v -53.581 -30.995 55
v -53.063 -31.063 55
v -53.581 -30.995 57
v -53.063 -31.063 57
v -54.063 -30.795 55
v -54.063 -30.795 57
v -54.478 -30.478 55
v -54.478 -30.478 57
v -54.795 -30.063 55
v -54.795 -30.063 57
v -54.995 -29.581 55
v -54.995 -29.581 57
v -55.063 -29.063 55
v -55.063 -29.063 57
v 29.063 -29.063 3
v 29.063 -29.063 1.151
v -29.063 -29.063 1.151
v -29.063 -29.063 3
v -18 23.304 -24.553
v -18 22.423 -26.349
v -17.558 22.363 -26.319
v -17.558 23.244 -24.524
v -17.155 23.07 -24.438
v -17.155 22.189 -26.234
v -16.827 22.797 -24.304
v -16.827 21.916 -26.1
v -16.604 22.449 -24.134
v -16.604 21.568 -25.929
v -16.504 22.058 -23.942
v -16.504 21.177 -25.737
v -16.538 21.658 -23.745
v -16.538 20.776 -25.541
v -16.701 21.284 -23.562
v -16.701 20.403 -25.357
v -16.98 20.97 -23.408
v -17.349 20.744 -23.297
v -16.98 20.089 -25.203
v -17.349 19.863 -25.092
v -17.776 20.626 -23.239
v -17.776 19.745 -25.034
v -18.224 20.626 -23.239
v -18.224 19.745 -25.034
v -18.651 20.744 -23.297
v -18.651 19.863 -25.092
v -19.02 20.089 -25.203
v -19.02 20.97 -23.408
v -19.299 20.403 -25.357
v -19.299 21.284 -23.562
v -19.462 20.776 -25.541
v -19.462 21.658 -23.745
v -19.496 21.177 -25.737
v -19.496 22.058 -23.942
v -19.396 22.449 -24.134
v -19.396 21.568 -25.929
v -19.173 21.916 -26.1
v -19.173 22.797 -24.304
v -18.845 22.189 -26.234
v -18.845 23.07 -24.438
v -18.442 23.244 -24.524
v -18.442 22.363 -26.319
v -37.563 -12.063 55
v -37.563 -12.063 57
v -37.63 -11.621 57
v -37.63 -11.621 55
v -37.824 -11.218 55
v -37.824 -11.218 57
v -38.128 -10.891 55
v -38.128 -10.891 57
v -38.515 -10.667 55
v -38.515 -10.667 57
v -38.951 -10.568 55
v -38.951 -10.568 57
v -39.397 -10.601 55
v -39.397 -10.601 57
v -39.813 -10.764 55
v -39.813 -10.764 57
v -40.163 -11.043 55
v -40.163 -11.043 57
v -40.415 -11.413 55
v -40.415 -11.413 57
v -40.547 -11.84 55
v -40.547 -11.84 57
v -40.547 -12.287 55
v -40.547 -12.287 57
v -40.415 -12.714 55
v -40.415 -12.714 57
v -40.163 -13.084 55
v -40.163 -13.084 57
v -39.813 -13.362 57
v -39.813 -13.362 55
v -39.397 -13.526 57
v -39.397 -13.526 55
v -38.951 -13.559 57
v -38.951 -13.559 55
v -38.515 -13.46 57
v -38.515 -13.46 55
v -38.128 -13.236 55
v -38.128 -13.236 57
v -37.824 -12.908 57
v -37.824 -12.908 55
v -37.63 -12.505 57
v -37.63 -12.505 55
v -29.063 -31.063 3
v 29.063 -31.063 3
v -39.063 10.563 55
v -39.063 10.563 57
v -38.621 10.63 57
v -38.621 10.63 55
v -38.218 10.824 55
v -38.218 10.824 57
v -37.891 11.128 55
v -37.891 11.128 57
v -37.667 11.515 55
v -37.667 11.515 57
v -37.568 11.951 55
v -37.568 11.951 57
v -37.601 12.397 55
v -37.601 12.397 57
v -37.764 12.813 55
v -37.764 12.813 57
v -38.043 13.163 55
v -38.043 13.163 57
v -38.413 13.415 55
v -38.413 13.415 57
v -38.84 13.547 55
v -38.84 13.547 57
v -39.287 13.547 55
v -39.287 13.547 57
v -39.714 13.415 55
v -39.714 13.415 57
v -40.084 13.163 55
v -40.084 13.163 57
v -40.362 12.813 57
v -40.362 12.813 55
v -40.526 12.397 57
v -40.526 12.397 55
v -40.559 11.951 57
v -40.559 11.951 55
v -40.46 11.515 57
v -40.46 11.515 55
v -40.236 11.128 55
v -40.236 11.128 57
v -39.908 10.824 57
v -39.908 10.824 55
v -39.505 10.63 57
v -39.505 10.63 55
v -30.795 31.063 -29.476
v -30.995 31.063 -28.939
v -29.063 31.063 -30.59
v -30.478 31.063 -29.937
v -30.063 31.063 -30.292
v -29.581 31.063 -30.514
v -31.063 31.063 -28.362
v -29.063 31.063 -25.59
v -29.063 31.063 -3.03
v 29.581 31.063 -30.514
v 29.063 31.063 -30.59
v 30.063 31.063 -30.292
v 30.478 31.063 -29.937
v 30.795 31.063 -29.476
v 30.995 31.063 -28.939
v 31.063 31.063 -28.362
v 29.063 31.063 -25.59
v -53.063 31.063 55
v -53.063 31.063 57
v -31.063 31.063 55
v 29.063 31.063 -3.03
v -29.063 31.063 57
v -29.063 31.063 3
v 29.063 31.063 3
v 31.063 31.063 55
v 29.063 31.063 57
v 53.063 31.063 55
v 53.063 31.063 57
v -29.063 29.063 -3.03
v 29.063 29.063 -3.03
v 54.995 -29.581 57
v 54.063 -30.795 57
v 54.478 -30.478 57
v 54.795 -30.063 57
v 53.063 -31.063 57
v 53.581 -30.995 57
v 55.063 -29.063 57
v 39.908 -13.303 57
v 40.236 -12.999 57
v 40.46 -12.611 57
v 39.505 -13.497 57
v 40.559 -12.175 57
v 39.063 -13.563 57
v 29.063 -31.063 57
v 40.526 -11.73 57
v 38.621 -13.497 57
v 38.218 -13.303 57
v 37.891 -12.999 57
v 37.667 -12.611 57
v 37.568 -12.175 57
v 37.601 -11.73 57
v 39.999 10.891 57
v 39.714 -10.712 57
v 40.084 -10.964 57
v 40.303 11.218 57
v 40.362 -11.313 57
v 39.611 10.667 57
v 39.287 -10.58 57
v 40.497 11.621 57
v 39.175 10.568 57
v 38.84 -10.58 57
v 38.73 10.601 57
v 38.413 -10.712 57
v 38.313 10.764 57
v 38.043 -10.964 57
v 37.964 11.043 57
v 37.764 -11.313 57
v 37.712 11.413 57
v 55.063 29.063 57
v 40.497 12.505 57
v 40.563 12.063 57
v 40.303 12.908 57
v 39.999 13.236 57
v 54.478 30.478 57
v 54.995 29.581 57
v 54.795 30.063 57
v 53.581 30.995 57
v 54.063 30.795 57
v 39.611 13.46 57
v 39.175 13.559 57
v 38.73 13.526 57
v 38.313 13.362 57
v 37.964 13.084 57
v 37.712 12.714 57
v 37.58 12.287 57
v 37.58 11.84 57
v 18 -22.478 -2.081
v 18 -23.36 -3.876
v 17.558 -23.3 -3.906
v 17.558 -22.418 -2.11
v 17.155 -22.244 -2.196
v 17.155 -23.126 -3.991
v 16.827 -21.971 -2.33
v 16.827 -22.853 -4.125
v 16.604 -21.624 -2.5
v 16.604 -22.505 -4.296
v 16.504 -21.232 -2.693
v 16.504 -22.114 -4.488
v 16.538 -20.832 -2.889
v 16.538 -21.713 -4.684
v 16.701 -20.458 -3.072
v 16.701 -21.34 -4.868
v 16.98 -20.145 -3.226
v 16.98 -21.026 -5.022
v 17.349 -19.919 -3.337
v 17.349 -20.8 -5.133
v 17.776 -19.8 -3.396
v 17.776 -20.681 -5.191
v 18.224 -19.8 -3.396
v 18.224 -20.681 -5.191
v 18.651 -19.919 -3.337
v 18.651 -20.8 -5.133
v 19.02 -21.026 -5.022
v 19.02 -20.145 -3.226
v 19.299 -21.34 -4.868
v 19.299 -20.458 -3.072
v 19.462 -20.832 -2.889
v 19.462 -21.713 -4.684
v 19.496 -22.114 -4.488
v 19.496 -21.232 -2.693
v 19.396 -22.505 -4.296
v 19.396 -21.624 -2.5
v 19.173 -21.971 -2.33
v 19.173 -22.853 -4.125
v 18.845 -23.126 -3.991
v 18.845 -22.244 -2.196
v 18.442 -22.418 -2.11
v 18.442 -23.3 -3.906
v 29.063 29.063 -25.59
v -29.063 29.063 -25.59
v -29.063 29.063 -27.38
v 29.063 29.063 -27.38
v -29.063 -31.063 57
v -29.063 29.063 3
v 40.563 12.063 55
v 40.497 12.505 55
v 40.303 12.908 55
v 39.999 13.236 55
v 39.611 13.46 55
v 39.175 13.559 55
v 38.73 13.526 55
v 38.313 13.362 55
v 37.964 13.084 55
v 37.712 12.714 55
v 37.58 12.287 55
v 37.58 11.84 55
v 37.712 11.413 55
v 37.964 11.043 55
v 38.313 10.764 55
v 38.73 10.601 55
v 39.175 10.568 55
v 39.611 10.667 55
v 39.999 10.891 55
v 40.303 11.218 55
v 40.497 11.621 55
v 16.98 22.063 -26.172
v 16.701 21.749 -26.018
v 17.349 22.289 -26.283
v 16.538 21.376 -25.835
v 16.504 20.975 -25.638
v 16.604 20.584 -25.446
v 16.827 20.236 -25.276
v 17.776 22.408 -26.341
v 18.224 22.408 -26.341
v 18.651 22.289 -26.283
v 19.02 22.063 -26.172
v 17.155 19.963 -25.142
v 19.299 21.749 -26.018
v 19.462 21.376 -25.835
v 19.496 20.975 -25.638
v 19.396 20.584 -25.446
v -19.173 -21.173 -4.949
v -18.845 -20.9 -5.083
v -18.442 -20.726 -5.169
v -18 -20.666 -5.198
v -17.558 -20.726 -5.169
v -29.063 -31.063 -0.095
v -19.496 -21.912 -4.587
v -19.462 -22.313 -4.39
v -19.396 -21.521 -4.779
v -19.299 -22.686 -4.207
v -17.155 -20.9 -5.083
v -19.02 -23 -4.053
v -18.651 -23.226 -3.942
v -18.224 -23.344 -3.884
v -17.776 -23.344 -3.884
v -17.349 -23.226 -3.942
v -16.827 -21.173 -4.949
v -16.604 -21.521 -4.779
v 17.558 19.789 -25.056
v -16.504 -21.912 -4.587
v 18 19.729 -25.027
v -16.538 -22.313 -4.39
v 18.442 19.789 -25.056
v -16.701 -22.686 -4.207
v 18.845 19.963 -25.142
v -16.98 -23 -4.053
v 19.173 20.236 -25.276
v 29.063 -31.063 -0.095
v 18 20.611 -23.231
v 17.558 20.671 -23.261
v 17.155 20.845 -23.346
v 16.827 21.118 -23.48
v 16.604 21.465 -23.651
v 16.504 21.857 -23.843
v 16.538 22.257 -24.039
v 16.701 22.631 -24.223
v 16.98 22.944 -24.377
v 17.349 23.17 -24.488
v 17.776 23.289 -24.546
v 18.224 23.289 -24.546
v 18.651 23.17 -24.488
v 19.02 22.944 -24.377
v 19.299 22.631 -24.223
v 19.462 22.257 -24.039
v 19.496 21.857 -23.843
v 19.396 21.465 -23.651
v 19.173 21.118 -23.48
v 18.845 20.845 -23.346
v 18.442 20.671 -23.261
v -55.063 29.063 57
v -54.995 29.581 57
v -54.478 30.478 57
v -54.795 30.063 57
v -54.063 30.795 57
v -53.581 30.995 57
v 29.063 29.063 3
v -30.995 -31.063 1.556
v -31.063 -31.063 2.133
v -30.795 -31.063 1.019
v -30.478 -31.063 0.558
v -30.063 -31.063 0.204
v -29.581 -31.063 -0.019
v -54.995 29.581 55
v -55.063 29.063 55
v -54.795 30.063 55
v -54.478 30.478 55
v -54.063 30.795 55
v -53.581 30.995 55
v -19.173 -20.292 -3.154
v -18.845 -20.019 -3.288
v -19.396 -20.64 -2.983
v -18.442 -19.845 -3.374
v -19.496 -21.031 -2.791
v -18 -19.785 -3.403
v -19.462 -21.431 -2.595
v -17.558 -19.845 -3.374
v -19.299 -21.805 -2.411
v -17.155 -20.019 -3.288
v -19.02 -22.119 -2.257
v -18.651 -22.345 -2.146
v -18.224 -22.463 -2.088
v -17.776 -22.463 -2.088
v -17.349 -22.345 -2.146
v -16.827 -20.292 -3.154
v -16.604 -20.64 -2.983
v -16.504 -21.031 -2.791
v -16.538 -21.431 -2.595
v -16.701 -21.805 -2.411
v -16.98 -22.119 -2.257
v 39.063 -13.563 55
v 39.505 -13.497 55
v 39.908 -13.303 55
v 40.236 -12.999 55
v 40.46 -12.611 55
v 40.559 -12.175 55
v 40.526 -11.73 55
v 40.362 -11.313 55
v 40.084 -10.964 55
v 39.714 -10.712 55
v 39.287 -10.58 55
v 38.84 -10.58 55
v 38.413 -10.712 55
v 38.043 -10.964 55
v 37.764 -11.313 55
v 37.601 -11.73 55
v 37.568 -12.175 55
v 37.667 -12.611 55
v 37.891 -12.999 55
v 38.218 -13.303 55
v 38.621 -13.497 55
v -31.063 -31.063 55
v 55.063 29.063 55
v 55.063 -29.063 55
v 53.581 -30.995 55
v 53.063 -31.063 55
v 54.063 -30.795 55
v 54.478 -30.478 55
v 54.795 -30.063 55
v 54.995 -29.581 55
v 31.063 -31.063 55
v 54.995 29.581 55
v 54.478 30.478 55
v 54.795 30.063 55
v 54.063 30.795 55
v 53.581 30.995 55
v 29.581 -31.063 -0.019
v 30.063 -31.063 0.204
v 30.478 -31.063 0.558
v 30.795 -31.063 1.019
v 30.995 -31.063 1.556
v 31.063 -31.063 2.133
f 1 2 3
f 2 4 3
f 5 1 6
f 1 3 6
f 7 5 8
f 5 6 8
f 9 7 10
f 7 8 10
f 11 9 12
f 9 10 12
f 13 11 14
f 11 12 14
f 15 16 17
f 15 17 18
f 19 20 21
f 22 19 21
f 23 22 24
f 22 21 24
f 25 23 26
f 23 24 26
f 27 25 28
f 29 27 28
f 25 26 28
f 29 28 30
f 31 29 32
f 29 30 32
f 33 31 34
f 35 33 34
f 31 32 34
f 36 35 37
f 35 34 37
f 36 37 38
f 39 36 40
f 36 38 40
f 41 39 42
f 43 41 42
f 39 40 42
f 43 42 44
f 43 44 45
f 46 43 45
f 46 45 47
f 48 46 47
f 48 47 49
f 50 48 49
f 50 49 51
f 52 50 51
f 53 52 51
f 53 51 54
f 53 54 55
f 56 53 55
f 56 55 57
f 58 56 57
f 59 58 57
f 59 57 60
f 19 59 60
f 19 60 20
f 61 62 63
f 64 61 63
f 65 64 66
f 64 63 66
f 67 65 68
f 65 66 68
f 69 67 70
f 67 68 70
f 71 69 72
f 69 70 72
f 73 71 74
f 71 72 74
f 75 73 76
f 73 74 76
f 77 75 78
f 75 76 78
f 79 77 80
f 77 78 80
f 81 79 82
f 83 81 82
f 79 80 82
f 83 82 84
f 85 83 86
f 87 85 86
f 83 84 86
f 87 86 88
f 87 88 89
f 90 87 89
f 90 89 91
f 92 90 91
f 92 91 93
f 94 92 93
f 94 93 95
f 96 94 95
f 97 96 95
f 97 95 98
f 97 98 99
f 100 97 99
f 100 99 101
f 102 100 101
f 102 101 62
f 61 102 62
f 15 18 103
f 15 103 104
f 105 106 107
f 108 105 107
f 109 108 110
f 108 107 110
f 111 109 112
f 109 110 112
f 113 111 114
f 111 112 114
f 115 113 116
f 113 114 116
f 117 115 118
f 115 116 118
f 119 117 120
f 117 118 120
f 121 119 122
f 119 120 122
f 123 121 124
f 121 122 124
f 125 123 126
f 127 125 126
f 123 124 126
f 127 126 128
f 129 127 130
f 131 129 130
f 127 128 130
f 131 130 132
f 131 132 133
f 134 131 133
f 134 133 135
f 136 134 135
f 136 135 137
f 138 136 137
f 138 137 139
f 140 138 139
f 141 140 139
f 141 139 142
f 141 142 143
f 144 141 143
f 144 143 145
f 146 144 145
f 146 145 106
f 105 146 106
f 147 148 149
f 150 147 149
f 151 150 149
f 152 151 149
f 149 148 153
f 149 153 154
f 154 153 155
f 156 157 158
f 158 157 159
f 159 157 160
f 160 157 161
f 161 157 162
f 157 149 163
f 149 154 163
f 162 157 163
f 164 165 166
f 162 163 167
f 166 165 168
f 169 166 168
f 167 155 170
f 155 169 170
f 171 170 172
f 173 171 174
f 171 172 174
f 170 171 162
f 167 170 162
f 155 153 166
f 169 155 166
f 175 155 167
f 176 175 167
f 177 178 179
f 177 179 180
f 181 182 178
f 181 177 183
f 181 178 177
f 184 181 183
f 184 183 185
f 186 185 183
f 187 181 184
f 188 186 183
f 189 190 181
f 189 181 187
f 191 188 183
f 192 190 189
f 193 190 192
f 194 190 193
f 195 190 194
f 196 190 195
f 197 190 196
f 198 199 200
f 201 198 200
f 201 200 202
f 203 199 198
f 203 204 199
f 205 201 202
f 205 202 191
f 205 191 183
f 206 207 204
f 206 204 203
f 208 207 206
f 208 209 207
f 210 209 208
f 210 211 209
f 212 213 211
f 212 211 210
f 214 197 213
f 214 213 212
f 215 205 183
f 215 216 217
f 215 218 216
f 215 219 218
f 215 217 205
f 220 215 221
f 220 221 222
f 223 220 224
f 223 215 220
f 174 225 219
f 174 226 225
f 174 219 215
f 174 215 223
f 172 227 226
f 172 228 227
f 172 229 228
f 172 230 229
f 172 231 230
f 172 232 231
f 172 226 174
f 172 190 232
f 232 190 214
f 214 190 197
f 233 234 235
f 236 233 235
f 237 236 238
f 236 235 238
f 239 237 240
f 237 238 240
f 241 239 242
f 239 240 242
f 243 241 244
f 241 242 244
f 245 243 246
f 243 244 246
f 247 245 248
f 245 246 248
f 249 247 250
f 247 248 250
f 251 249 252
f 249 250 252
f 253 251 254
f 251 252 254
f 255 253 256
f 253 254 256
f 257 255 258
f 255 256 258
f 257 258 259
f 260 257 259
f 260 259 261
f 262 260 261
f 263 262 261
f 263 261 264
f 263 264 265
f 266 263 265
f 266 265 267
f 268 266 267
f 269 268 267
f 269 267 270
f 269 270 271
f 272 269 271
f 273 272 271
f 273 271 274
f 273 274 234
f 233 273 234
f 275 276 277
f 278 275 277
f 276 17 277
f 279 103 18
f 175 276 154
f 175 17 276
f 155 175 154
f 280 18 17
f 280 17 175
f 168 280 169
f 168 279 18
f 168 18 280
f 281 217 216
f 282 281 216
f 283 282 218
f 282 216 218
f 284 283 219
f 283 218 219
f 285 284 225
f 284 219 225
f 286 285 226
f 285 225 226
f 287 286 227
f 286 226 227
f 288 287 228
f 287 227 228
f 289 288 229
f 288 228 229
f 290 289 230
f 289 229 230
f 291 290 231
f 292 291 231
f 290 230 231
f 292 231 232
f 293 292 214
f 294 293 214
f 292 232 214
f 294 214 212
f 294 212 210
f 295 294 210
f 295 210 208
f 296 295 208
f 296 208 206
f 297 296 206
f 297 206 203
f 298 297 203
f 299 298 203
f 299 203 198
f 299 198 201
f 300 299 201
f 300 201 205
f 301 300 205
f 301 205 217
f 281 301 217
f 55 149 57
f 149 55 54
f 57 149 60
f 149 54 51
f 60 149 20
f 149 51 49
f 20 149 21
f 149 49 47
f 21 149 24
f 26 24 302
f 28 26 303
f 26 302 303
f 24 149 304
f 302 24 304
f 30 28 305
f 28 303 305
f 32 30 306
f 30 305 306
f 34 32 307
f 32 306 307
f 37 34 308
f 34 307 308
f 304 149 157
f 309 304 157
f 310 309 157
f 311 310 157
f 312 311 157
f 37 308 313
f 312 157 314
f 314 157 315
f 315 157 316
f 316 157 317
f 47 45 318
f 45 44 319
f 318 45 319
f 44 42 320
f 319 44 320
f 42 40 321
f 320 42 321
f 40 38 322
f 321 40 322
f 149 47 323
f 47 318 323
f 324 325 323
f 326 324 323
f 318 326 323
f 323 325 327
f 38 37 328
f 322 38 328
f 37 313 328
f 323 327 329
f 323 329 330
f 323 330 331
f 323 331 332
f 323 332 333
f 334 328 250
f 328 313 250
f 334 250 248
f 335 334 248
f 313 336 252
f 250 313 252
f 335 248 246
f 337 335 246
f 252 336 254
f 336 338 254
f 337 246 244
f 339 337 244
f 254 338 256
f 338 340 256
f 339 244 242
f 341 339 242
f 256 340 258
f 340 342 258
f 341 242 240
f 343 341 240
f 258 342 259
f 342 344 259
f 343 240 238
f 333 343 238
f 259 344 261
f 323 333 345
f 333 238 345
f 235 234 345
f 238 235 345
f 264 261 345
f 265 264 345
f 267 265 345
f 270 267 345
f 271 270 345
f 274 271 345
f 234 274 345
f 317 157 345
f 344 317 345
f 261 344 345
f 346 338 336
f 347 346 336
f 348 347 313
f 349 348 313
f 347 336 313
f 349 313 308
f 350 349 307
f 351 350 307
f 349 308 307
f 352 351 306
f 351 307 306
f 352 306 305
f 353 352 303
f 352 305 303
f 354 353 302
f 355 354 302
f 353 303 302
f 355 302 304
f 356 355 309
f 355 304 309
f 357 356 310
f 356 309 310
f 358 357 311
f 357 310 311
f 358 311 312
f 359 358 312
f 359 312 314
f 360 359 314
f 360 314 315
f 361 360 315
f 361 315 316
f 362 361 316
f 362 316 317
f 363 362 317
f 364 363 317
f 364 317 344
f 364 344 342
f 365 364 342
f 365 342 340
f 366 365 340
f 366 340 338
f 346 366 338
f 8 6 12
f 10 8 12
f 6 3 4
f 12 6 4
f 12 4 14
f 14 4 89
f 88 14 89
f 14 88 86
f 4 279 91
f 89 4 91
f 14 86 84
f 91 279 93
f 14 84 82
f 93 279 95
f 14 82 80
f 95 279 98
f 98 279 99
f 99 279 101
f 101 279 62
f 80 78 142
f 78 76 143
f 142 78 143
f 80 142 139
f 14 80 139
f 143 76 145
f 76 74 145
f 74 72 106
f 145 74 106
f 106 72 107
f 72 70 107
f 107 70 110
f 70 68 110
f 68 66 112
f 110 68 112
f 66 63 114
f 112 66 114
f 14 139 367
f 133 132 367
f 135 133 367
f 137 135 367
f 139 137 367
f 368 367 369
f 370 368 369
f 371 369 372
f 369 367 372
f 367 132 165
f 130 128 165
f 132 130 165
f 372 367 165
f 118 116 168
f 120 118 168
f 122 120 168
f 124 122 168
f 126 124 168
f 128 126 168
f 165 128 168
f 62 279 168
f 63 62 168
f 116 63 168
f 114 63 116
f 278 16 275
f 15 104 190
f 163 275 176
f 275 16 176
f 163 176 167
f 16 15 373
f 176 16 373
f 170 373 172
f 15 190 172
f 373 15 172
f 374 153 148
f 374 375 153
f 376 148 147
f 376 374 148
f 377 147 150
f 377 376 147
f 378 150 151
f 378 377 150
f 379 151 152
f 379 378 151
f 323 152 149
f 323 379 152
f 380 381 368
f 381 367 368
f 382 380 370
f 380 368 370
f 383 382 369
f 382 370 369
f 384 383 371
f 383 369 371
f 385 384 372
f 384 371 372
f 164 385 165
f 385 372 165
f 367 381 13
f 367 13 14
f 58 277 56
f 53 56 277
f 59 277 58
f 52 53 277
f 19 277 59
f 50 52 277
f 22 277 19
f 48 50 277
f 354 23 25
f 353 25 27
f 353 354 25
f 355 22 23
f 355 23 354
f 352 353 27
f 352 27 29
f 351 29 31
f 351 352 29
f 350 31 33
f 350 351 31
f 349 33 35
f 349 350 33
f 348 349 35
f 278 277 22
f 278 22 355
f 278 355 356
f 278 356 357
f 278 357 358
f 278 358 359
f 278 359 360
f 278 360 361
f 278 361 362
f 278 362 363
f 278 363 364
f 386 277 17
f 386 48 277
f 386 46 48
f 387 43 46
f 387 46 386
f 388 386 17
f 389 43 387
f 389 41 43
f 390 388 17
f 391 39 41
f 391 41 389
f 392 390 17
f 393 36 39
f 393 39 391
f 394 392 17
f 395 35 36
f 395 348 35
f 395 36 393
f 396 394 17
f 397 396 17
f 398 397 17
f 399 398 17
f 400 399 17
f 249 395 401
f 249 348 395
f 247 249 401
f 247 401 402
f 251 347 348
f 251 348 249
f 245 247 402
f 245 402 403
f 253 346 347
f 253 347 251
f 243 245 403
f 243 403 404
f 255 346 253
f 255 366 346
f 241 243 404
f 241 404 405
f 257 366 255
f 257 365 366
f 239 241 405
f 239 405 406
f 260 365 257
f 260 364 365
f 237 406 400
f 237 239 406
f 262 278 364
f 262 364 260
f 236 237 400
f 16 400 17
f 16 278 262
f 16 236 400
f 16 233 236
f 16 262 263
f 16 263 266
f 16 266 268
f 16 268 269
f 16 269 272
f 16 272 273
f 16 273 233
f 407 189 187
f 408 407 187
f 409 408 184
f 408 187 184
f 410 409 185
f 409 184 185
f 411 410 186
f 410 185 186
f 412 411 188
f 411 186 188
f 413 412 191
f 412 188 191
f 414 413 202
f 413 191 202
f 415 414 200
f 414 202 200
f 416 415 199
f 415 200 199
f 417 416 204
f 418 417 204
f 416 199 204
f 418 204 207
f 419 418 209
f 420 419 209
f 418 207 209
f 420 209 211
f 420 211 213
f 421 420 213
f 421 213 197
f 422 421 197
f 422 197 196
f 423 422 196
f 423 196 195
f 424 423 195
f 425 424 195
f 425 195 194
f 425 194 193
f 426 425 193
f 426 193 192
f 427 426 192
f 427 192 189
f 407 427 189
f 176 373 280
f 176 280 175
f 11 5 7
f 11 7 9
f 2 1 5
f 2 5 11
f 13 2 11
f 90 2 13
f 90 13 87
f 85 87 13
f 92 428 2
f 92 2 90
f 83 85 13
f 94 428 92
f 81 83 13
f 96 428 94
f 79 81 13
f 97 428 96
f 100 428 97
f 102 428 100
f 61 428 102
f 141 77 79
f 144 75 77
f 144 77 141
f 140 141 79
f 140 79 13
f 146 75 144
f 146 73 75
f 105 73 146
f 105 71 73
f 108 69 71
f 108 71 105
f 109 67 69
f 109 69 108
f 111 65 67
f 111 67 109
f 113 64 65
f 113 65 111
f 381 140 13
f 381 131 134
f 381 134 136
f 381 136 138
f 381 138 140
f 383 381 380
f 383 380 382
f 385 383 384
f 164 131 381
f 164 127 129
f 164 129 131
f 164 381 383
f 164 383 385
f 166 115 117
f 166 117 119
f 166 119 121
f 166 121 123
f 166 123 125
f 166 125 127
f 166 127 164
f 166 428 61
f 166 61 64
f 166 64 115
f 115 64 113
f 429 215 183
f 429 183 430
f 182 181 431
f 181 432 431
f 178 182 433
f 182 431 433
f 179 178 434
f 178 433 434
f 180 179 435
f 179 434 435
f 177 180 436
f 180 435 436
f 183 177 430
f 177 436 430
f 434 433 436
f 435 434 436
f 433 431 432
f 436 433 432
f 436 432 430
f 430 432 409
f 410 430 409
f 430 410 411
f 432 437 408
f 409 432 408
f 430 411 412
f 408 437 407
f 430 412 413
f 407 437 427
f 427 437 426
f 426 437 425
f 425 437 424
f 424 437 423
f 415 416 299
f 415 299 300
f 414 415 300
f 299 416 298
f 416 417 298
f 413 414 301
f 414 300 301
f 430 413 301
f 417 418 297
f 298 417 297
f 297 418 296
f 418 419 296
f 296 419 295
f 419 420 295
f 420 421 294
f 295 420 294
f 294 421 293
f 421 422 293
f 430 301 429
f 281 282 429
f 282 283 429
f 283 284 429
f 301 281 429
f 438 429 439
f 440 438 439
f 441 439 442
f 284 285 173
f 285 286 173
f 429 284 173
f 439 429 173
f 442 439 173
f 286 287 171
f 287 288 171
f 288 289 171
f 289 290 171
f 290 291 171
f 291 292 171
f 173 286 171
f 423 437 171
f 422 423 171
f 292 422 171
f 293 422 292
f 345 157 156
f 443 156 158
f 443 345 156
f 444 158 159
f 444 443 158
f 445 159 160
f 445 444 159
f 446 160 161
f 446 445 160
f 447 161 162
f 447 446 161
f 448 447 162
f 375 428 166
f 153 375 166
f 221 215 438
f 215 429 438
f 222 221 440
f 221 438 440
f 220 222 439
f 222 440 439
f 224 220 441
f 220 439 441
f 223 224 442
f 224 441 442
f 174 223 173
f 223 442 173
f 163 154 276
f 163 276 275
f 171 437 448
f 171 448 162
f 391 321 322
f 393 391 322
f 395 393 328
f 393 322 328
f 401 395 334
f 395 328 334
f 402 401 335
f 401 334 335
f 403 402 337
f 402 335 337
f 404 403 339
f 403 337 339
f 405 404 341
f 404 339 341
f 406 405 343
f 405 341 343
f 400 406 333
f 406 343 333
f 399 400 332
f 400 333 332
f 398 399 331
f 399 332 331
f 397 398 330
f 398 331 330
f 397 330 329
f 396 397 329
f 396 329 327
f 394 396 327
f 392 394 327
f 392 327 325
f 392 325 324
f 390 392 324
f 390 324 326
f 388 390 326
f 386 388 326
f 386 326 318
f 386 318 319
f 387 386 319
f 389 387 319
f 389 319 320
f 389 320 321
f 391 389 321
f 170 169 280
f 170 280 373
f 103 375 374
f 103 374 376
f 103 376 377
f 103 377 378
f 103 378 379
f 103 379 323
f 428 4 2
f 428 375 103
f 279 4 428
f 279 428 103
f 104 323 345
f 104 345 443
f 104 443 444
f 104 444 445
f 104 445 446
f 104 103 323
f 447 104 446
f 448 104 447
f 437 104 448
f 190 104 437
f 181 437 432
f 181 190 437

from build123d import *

# Parameters (mm, degrees)
SKETCH_1_W           = 62.126713746
SKETCH_1_H           = 62.126713746
EXTRUDE_1_DEPTH      = 57
SKETCH_3_W           = 58.126713746
SKETCH_3_H           = 62.126713746
CUT_EXTRUDE_5_DEPTH  = 54
SKETCH_4_W           = 2
SKETCH_4_H           = 62.126713746
EXTRUDE_2_DEPTH      = 24
SKETCH_5_W           = 2
SKETCH_5_H           = 62.126713746
EXTRUDE_3_DEPTH      = 24
SKETCH_6_R           = 1.5
CUT_EXTRUDE_6_DEPTH  = 24
SKETCH_7_R           = 1.5
CUT_EXTRUDE_7_DEPTH  = 24
FILLET_3_R           = 2
FILLET_4_R           = 2
FILLET_5_R           = 2
FILLET_6_R           = 2
SKETCH_1_2_W         = 62.126713746
SKETCH_1_2_H         = 62.126713746
EXTRUDE_4_DEPTH      = 30.59
CUT_EXTRUDE_8_DEPTH  = 70
SKETCH_12_R          = 1.5
CUT_EXTRUDE_9_DEPTH  = 10
CUT_EXTRUDE_10_REACH = 108.26
SKETCH_15_W          = 58.126713746
SKETCH_15_H          = 22.559791582
CUT_EXTRUDE_11_DEPTH = 2
FILLET_7_R           = 2
FILLET_8_R           = 2


with BuildPart() as part:
    # 草图1 → 凸台-拉伸1 (new body)
    with BuildSketch(Plane.XY):
        Rectangle(SKETCH_1_W, SKETCH_1_H)
    extrude(amount=EXTRUDE_1_DEPTH)

    # 草图3 → 切除-拉伸5 (cut)
    with BuildSketch(Plane.XY.offset(57)):
        Rectangle(SKETCH_3_W, SKETCH_3_H)
    extrude(amount=-CUT_EXTRUDE_5_DEPTH, mode=Mode.SUBTRACT)

    # 草图4 → 凸台-拉伸2 (add)
    with BuildSketch(Plane(origin=(31.063356873, 0, 0), x_dir=(0, 0, -1), z_dir=(1, 0, 0))):
        with Locations((-56, 0)):
            Rectangle(SKETCH_4_W, SKETCH_4_H)
    extrude(amount=EXTRUDE_2_DEPTH)

    # 草图5 → 凸台-拉伸3 (add)
    with BuildSketch(Plane.ZY.offset(31.063356873)):
        with Locations((56, 0)):
            Rectangle(SKETCH_5_W, SKETCH_5_H)
    extrude(amount=EXTRUDE_3_DEPTH)

    # 草图6 → 切除-拉伸6 (cut)
    with BuildSketch(Plane.XY.offset(57)):
        with Locations((39.063356873, 12.063356873)):
            Circle(SKETCH_6_R)
        with Locations(Location((-39.063356873, 12.063356873, 0), (0, 0, 270))):
            Circle(SKETCH_6_R)
        with Locations(Location((39.063356873, -12.063356873, 0), (0, 0, 270))):
            Circle(SKETCH_6_R)
        with Locations((-39.063356873, -12.063356873)):
            Circle(SKETCH_6_R)
    extrude(amount=-CUT_EXTRUDE_6_DEPTH, mode=Mode.SUBTRACT)

    # 草图7 → 切除-拉伸7 (cut)
    with BuildSketch(Plane(origin=(0, 0, 0), x_dir=(-1, 0, 0), z_dir=(0, 0, -1))):
        with Locations((-18, 24)):
            Circle(SKETCH_7_R)
        with Locations((18, 24)):
            Circle(SKETCH_7_R)
        with Locations((18, -24)):
            Circle(SKETCH_7_R)
        with Locations((-18, -24)):
            Circle(SKETCH_7_R)
    extrude(amount=-CUT_EXTRUDE_7_DEPTH, mode=Mode.SUBTRACT)

    # 圆角3
    fillet_3_edges = [part.edges().sort_by_distance(p)[0] for p in [
        (55.063356873, -31.063356873, 56),
    ]]
    fillet(fillet_3_edges, radius=FILLET_3_R)

    # 圆角4
    fillet_4_edges = [part.edges().sort_by_distance(p)[0] for p in [
        (55.063356873, 31.063356873, 56),
    ]]
    fillet(fillet_4_edges, radius=FILLET_4_R)

    # 圆角5
    fillet_5_edges = [part.edges().sort_by_distance(p)[0] for p in [
        (-55.063356873, -31.063356873, 56),
    ]]
    fillet(fillet_5_edges, radius=FILLET_5_R)

    # 圆角6
    fillet_6_edges = [part.edges().sort_by_distance(p)[0] for p in [
        (-55.063356873, 31.063356873, 56),
    ]]
    fillet(fillet_6_edges, radius=FILLET_6_R)

    # 草图1<2> → 凸台-拉伸4 (add)
    with BuildSketch(Plane.XY):
        Rectangle(SKETCH_1_2_W, SKETCH_1_2_H)
    extrude(amount=-EXTRUDE_4_DEPTH)

    # 草图11 → 切除-拉伸8 (cut)
    with BuildSketch(Plane(origin=(31.063356873, 0, 0), x_dir=(0, 0, -1), z_dir=(1, 0, 0))):
        Polygon((30.59, 31.063356873), (0, -31.256692995), (30.59, -31.063356873), align=None)
    extrude(amount=-CUT_EXTRUDE_8_DEPTH, mode=Mode.SUBTRACT)

    # 草图12 → 切除-拉伸9 (cut)
    with BuildSketch(Plane(origin=(0, -6.068714237, -12.363601631), x_dir=(-1, 0, 0), z_dir=(0, -0.440632808345781, -0.8976874334696406))):
        with Locations(Location((18, -17.761485842, 0), (0, 0, 90))):
            Circle(SKETCH_12_R)
        with Locations(Location((-18, -17.761485842, 0), (0, 0, 270))):
            Circle(SKETCH_12_R)
        with Locations(Location((18, 30.238514158, 0), (0, 0, 90))):
            Circle(SKETCH_12_R)
        with Locations(Location((-18, 30.238514158, 0), (0, 0, 270))):
            Circle(SKETCH_12_R)
    extrude(amount=-CUT_EXTRUDE_9_DEPTH, mode=Mode.SUBTRACT)

    # 切除-拉伸10: up to this face of the body (flat: up to its plane)
    cut_extrude_10_end = Plane(part.part.faces().sort_by_distance((-29.063356873, 0, 30))[0])
    # 草图14 → 切除-拉伸10 (cut, up to the picked face)
    with BuildSketch(Plane.ZY.offset(-29.063356873), mode=Mode.PRIVATE) as cut_extrude_10_sk1:
        Polygon((3, -29.063356873), (3, 29.063356873), (-27.380346496, 29.063356873), (1.151340775, -29.063356873), align=None)
    cut_extrude_10_tool1 = split(extrude(cut_extrude_10_sk1.sketch, amount=CUT_EXTRUDE_10_REACH, mode=Mode.PRIVATE), bisect_by=cut_extrude_10_end, keep=Keep.BOTH, mode=Mode.PRIVATE)
    add(cut_extrude_10_tool1.solids().sort_by(Axis((29.063357, 8.576401, -7.162129), (-1, 0, 0)))[0], mode=Mode.SUBTRACT)

    # 草图15 → 切除-拉伸11 (cut)
    with BuildSketch(Plane(origin=(0, 31.063356873, 0), x_dir=(1, 0, 0), z_dir=(0, 1, 0))):
        with Locations((0, 14.310104209)):
            Rectangle(SKETCH_15_W, SKETCH_15_H)
    extrude(amount=-CUT_EXTRUDE_11_DEPTH, mode=Mode.SUBTRACT)

    # 圆角7
    fillet_7_edges = [part.edges().sort_by_distance(p)[0] for p in [
        (-31.063356873, 0, -15.342449833),
    ]]
    fillet(fillet_7_edges, radius=FILLET_7_R)

    # 圆角8
    fillet_8_edges = [part.edges().sort_by_distance(p)[0] for p in [
        (31.063356873, 0, -15.342449833),
    ]]
    fillet(fillet_8_edges, radius=FILLET_8_R)


solid = part.part
